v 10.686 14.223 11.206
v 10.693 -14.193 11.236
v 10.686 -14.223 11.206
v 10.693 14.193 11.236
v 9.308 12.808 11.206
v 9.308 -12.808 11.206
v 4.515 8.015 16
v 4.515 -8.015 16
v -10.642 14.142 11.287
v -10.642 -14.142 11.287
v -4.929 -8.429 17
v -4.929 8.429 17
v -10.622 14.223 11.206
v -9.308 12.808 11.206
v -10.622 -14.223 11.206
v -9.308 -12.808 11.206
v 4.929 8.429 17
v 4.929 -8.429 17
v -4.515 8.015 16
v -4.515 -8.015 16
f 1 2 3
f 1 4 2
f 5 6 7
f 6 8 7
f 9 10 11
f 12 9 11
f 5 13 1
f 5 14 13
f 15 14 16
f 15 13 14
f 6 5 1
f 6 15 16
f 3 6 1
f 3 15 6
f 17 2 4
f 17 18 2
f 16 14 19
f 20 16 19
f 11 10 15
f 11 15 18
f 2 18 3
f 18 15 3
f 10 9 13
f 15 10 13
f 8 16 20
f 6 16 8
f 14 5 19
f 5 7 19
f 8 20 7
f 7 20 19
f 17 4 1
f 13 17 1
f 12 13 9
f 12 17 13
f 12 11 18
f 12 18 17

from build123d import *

# Parameters (mm, degrees)
F0_W      = 16.1028504372
F0_H      = 24.0115216002
F2_W      = 24
F2_H      = 31
F5_W      = 14.02631565
F5_H      = 35.0832007825
F6_DEPTH  = 5
F8_W      = 36.7084983736
F8_H      = 15.6723505352
F9_DEPTH  = 5
F11_W     = 29.3105235323
F11_H     = 18.8404771034
F12_DEPTH = 5
F14_W     = 31.5226018429
F14_H     = 13.2806529291
F15_DEPTH = 5
F16_W     = 23.4492318705
F16_H     = 12.546513346
F17_DEPTH = 25.4
F18_T     = 1


# Not quite as in the source:
# - a shell that OpenCascade refuses in one call is made with other operations: the cavity is built on its own and cut out


with BuildPart() as f3:
    # F0 (on Top) → F3 section 0
    with BuildSketch(Plane.XY):
        with Locations((0.0935448334, 0.0057467259)):
            Rectangle(F0_W, F0_H)
    # F2 (on offset) → F3 section 1
    with BuildSketch(Plane.XY.offset(17)):
        Rectangle(F2_W, F2_H)
    loft()

    # F5 (on face) → F6 (cut)
    with BuildSketch(Plane(origin=(-14.5, 0, 14.5), x_dir=(0.7071067812, 0, 0.7071067812), z_dir=(0.7071067812, 0, -0.7071067812))):
        with Locations((2.1269769641, -0.2655759454)):
            Rectangle(F5_W, F5_H)
    extrude(amount=F6_DEPTH, mode=Mode.SUBTRACT)

    # F8 (on face) → F9 (cut)
    with BuildSketch(Plane(origin=(14.5, 0, 14.5), x_dir=(0, 1, 0), z_dir=(0.7071067812, 0, 0.7071067812))):
        with Locations((-0.0566011295, 4.1208126349)):
            Rectangle(F8_W, F8_H)
    extrude(amount=-F9_DEPTH, mode=Mode.SUBTRACT)

    # F11 (on face) → F12 (cut)
    with BuildSketch(Plane(origin=(0, 16.25, 16.25), x_dir=(-1, 0, 0), z_dir=(0, 0.7071067812, 0.7071067812))):
        with Locations((0.3414950334, 3.7744397996)):
            Rectangle(F11_W, F11_H)
    extrude(amount=-F12_DEPTH, mode=Mode.SUBTRACT)

    # F14 (on face) → F15 (cut)
    with BuildSketch(Plane(origin=(0, -16.25, 16.25), x_dir=(1, 0, 0), z_dir=(0, 0.7071067812, -0.7071067812))):
        with Locations((0.8808970451, -0.6048630457)):
            Rectangle(F14_W, F14_H)
    extrude(amount=F15_DEPTH, mode=Mode.SUBTRACT)

    # F16 (on Front) → F17 (cut, symmetric)
    with BuildSketch(Plane.XZ):
        with Locations((-0.0993120484, 4.9331299379)):
            Rectangle(F16_W, F16_H)
    extrude(amount=F17_DEPTH, both=True, mode=Mode.SUBTRACT)

    # F18: shell of thickness 1, made by hand


with BuildPart() as f18_core1:
    # F18_t2: copy of F3
    add(f3.part)

    # the walls: a layer under each face that stays
    f18_faces = [f18_core1.faces().sort_by_distance(p)[0] for p in [
        (10.6895617231, -5.424e-06, 11.2211990551),
        (0.0256243836, -11.3257388827, 14.1031933054),
        (7.8109264385, 0, 14.1180057497),
        (0.0256243836, 11.3257388827, 14.1031933054),
        (0, 0, 17),
        (-7.7853020549, 0, 14.1436301332),
        (-10.6320571867, -1.4807e-05, 11.2468234387),
    ]]
    thicken(f18_faces, amount=-F18_T, mode=Mode.SUBTRACT)


with BuildPart() as f3_1:
    add(f3.part)

    # what is left inside the walls is the cavity
    f18_cavity = [f18_core1.part.solids().sort_by_distance(p)[0] for p in [
        (0, 4.269444, 11.216387),
    ]]
    add(f18_cavity, mode=Mode.SUBTRACT)


solid = f3_1.part
